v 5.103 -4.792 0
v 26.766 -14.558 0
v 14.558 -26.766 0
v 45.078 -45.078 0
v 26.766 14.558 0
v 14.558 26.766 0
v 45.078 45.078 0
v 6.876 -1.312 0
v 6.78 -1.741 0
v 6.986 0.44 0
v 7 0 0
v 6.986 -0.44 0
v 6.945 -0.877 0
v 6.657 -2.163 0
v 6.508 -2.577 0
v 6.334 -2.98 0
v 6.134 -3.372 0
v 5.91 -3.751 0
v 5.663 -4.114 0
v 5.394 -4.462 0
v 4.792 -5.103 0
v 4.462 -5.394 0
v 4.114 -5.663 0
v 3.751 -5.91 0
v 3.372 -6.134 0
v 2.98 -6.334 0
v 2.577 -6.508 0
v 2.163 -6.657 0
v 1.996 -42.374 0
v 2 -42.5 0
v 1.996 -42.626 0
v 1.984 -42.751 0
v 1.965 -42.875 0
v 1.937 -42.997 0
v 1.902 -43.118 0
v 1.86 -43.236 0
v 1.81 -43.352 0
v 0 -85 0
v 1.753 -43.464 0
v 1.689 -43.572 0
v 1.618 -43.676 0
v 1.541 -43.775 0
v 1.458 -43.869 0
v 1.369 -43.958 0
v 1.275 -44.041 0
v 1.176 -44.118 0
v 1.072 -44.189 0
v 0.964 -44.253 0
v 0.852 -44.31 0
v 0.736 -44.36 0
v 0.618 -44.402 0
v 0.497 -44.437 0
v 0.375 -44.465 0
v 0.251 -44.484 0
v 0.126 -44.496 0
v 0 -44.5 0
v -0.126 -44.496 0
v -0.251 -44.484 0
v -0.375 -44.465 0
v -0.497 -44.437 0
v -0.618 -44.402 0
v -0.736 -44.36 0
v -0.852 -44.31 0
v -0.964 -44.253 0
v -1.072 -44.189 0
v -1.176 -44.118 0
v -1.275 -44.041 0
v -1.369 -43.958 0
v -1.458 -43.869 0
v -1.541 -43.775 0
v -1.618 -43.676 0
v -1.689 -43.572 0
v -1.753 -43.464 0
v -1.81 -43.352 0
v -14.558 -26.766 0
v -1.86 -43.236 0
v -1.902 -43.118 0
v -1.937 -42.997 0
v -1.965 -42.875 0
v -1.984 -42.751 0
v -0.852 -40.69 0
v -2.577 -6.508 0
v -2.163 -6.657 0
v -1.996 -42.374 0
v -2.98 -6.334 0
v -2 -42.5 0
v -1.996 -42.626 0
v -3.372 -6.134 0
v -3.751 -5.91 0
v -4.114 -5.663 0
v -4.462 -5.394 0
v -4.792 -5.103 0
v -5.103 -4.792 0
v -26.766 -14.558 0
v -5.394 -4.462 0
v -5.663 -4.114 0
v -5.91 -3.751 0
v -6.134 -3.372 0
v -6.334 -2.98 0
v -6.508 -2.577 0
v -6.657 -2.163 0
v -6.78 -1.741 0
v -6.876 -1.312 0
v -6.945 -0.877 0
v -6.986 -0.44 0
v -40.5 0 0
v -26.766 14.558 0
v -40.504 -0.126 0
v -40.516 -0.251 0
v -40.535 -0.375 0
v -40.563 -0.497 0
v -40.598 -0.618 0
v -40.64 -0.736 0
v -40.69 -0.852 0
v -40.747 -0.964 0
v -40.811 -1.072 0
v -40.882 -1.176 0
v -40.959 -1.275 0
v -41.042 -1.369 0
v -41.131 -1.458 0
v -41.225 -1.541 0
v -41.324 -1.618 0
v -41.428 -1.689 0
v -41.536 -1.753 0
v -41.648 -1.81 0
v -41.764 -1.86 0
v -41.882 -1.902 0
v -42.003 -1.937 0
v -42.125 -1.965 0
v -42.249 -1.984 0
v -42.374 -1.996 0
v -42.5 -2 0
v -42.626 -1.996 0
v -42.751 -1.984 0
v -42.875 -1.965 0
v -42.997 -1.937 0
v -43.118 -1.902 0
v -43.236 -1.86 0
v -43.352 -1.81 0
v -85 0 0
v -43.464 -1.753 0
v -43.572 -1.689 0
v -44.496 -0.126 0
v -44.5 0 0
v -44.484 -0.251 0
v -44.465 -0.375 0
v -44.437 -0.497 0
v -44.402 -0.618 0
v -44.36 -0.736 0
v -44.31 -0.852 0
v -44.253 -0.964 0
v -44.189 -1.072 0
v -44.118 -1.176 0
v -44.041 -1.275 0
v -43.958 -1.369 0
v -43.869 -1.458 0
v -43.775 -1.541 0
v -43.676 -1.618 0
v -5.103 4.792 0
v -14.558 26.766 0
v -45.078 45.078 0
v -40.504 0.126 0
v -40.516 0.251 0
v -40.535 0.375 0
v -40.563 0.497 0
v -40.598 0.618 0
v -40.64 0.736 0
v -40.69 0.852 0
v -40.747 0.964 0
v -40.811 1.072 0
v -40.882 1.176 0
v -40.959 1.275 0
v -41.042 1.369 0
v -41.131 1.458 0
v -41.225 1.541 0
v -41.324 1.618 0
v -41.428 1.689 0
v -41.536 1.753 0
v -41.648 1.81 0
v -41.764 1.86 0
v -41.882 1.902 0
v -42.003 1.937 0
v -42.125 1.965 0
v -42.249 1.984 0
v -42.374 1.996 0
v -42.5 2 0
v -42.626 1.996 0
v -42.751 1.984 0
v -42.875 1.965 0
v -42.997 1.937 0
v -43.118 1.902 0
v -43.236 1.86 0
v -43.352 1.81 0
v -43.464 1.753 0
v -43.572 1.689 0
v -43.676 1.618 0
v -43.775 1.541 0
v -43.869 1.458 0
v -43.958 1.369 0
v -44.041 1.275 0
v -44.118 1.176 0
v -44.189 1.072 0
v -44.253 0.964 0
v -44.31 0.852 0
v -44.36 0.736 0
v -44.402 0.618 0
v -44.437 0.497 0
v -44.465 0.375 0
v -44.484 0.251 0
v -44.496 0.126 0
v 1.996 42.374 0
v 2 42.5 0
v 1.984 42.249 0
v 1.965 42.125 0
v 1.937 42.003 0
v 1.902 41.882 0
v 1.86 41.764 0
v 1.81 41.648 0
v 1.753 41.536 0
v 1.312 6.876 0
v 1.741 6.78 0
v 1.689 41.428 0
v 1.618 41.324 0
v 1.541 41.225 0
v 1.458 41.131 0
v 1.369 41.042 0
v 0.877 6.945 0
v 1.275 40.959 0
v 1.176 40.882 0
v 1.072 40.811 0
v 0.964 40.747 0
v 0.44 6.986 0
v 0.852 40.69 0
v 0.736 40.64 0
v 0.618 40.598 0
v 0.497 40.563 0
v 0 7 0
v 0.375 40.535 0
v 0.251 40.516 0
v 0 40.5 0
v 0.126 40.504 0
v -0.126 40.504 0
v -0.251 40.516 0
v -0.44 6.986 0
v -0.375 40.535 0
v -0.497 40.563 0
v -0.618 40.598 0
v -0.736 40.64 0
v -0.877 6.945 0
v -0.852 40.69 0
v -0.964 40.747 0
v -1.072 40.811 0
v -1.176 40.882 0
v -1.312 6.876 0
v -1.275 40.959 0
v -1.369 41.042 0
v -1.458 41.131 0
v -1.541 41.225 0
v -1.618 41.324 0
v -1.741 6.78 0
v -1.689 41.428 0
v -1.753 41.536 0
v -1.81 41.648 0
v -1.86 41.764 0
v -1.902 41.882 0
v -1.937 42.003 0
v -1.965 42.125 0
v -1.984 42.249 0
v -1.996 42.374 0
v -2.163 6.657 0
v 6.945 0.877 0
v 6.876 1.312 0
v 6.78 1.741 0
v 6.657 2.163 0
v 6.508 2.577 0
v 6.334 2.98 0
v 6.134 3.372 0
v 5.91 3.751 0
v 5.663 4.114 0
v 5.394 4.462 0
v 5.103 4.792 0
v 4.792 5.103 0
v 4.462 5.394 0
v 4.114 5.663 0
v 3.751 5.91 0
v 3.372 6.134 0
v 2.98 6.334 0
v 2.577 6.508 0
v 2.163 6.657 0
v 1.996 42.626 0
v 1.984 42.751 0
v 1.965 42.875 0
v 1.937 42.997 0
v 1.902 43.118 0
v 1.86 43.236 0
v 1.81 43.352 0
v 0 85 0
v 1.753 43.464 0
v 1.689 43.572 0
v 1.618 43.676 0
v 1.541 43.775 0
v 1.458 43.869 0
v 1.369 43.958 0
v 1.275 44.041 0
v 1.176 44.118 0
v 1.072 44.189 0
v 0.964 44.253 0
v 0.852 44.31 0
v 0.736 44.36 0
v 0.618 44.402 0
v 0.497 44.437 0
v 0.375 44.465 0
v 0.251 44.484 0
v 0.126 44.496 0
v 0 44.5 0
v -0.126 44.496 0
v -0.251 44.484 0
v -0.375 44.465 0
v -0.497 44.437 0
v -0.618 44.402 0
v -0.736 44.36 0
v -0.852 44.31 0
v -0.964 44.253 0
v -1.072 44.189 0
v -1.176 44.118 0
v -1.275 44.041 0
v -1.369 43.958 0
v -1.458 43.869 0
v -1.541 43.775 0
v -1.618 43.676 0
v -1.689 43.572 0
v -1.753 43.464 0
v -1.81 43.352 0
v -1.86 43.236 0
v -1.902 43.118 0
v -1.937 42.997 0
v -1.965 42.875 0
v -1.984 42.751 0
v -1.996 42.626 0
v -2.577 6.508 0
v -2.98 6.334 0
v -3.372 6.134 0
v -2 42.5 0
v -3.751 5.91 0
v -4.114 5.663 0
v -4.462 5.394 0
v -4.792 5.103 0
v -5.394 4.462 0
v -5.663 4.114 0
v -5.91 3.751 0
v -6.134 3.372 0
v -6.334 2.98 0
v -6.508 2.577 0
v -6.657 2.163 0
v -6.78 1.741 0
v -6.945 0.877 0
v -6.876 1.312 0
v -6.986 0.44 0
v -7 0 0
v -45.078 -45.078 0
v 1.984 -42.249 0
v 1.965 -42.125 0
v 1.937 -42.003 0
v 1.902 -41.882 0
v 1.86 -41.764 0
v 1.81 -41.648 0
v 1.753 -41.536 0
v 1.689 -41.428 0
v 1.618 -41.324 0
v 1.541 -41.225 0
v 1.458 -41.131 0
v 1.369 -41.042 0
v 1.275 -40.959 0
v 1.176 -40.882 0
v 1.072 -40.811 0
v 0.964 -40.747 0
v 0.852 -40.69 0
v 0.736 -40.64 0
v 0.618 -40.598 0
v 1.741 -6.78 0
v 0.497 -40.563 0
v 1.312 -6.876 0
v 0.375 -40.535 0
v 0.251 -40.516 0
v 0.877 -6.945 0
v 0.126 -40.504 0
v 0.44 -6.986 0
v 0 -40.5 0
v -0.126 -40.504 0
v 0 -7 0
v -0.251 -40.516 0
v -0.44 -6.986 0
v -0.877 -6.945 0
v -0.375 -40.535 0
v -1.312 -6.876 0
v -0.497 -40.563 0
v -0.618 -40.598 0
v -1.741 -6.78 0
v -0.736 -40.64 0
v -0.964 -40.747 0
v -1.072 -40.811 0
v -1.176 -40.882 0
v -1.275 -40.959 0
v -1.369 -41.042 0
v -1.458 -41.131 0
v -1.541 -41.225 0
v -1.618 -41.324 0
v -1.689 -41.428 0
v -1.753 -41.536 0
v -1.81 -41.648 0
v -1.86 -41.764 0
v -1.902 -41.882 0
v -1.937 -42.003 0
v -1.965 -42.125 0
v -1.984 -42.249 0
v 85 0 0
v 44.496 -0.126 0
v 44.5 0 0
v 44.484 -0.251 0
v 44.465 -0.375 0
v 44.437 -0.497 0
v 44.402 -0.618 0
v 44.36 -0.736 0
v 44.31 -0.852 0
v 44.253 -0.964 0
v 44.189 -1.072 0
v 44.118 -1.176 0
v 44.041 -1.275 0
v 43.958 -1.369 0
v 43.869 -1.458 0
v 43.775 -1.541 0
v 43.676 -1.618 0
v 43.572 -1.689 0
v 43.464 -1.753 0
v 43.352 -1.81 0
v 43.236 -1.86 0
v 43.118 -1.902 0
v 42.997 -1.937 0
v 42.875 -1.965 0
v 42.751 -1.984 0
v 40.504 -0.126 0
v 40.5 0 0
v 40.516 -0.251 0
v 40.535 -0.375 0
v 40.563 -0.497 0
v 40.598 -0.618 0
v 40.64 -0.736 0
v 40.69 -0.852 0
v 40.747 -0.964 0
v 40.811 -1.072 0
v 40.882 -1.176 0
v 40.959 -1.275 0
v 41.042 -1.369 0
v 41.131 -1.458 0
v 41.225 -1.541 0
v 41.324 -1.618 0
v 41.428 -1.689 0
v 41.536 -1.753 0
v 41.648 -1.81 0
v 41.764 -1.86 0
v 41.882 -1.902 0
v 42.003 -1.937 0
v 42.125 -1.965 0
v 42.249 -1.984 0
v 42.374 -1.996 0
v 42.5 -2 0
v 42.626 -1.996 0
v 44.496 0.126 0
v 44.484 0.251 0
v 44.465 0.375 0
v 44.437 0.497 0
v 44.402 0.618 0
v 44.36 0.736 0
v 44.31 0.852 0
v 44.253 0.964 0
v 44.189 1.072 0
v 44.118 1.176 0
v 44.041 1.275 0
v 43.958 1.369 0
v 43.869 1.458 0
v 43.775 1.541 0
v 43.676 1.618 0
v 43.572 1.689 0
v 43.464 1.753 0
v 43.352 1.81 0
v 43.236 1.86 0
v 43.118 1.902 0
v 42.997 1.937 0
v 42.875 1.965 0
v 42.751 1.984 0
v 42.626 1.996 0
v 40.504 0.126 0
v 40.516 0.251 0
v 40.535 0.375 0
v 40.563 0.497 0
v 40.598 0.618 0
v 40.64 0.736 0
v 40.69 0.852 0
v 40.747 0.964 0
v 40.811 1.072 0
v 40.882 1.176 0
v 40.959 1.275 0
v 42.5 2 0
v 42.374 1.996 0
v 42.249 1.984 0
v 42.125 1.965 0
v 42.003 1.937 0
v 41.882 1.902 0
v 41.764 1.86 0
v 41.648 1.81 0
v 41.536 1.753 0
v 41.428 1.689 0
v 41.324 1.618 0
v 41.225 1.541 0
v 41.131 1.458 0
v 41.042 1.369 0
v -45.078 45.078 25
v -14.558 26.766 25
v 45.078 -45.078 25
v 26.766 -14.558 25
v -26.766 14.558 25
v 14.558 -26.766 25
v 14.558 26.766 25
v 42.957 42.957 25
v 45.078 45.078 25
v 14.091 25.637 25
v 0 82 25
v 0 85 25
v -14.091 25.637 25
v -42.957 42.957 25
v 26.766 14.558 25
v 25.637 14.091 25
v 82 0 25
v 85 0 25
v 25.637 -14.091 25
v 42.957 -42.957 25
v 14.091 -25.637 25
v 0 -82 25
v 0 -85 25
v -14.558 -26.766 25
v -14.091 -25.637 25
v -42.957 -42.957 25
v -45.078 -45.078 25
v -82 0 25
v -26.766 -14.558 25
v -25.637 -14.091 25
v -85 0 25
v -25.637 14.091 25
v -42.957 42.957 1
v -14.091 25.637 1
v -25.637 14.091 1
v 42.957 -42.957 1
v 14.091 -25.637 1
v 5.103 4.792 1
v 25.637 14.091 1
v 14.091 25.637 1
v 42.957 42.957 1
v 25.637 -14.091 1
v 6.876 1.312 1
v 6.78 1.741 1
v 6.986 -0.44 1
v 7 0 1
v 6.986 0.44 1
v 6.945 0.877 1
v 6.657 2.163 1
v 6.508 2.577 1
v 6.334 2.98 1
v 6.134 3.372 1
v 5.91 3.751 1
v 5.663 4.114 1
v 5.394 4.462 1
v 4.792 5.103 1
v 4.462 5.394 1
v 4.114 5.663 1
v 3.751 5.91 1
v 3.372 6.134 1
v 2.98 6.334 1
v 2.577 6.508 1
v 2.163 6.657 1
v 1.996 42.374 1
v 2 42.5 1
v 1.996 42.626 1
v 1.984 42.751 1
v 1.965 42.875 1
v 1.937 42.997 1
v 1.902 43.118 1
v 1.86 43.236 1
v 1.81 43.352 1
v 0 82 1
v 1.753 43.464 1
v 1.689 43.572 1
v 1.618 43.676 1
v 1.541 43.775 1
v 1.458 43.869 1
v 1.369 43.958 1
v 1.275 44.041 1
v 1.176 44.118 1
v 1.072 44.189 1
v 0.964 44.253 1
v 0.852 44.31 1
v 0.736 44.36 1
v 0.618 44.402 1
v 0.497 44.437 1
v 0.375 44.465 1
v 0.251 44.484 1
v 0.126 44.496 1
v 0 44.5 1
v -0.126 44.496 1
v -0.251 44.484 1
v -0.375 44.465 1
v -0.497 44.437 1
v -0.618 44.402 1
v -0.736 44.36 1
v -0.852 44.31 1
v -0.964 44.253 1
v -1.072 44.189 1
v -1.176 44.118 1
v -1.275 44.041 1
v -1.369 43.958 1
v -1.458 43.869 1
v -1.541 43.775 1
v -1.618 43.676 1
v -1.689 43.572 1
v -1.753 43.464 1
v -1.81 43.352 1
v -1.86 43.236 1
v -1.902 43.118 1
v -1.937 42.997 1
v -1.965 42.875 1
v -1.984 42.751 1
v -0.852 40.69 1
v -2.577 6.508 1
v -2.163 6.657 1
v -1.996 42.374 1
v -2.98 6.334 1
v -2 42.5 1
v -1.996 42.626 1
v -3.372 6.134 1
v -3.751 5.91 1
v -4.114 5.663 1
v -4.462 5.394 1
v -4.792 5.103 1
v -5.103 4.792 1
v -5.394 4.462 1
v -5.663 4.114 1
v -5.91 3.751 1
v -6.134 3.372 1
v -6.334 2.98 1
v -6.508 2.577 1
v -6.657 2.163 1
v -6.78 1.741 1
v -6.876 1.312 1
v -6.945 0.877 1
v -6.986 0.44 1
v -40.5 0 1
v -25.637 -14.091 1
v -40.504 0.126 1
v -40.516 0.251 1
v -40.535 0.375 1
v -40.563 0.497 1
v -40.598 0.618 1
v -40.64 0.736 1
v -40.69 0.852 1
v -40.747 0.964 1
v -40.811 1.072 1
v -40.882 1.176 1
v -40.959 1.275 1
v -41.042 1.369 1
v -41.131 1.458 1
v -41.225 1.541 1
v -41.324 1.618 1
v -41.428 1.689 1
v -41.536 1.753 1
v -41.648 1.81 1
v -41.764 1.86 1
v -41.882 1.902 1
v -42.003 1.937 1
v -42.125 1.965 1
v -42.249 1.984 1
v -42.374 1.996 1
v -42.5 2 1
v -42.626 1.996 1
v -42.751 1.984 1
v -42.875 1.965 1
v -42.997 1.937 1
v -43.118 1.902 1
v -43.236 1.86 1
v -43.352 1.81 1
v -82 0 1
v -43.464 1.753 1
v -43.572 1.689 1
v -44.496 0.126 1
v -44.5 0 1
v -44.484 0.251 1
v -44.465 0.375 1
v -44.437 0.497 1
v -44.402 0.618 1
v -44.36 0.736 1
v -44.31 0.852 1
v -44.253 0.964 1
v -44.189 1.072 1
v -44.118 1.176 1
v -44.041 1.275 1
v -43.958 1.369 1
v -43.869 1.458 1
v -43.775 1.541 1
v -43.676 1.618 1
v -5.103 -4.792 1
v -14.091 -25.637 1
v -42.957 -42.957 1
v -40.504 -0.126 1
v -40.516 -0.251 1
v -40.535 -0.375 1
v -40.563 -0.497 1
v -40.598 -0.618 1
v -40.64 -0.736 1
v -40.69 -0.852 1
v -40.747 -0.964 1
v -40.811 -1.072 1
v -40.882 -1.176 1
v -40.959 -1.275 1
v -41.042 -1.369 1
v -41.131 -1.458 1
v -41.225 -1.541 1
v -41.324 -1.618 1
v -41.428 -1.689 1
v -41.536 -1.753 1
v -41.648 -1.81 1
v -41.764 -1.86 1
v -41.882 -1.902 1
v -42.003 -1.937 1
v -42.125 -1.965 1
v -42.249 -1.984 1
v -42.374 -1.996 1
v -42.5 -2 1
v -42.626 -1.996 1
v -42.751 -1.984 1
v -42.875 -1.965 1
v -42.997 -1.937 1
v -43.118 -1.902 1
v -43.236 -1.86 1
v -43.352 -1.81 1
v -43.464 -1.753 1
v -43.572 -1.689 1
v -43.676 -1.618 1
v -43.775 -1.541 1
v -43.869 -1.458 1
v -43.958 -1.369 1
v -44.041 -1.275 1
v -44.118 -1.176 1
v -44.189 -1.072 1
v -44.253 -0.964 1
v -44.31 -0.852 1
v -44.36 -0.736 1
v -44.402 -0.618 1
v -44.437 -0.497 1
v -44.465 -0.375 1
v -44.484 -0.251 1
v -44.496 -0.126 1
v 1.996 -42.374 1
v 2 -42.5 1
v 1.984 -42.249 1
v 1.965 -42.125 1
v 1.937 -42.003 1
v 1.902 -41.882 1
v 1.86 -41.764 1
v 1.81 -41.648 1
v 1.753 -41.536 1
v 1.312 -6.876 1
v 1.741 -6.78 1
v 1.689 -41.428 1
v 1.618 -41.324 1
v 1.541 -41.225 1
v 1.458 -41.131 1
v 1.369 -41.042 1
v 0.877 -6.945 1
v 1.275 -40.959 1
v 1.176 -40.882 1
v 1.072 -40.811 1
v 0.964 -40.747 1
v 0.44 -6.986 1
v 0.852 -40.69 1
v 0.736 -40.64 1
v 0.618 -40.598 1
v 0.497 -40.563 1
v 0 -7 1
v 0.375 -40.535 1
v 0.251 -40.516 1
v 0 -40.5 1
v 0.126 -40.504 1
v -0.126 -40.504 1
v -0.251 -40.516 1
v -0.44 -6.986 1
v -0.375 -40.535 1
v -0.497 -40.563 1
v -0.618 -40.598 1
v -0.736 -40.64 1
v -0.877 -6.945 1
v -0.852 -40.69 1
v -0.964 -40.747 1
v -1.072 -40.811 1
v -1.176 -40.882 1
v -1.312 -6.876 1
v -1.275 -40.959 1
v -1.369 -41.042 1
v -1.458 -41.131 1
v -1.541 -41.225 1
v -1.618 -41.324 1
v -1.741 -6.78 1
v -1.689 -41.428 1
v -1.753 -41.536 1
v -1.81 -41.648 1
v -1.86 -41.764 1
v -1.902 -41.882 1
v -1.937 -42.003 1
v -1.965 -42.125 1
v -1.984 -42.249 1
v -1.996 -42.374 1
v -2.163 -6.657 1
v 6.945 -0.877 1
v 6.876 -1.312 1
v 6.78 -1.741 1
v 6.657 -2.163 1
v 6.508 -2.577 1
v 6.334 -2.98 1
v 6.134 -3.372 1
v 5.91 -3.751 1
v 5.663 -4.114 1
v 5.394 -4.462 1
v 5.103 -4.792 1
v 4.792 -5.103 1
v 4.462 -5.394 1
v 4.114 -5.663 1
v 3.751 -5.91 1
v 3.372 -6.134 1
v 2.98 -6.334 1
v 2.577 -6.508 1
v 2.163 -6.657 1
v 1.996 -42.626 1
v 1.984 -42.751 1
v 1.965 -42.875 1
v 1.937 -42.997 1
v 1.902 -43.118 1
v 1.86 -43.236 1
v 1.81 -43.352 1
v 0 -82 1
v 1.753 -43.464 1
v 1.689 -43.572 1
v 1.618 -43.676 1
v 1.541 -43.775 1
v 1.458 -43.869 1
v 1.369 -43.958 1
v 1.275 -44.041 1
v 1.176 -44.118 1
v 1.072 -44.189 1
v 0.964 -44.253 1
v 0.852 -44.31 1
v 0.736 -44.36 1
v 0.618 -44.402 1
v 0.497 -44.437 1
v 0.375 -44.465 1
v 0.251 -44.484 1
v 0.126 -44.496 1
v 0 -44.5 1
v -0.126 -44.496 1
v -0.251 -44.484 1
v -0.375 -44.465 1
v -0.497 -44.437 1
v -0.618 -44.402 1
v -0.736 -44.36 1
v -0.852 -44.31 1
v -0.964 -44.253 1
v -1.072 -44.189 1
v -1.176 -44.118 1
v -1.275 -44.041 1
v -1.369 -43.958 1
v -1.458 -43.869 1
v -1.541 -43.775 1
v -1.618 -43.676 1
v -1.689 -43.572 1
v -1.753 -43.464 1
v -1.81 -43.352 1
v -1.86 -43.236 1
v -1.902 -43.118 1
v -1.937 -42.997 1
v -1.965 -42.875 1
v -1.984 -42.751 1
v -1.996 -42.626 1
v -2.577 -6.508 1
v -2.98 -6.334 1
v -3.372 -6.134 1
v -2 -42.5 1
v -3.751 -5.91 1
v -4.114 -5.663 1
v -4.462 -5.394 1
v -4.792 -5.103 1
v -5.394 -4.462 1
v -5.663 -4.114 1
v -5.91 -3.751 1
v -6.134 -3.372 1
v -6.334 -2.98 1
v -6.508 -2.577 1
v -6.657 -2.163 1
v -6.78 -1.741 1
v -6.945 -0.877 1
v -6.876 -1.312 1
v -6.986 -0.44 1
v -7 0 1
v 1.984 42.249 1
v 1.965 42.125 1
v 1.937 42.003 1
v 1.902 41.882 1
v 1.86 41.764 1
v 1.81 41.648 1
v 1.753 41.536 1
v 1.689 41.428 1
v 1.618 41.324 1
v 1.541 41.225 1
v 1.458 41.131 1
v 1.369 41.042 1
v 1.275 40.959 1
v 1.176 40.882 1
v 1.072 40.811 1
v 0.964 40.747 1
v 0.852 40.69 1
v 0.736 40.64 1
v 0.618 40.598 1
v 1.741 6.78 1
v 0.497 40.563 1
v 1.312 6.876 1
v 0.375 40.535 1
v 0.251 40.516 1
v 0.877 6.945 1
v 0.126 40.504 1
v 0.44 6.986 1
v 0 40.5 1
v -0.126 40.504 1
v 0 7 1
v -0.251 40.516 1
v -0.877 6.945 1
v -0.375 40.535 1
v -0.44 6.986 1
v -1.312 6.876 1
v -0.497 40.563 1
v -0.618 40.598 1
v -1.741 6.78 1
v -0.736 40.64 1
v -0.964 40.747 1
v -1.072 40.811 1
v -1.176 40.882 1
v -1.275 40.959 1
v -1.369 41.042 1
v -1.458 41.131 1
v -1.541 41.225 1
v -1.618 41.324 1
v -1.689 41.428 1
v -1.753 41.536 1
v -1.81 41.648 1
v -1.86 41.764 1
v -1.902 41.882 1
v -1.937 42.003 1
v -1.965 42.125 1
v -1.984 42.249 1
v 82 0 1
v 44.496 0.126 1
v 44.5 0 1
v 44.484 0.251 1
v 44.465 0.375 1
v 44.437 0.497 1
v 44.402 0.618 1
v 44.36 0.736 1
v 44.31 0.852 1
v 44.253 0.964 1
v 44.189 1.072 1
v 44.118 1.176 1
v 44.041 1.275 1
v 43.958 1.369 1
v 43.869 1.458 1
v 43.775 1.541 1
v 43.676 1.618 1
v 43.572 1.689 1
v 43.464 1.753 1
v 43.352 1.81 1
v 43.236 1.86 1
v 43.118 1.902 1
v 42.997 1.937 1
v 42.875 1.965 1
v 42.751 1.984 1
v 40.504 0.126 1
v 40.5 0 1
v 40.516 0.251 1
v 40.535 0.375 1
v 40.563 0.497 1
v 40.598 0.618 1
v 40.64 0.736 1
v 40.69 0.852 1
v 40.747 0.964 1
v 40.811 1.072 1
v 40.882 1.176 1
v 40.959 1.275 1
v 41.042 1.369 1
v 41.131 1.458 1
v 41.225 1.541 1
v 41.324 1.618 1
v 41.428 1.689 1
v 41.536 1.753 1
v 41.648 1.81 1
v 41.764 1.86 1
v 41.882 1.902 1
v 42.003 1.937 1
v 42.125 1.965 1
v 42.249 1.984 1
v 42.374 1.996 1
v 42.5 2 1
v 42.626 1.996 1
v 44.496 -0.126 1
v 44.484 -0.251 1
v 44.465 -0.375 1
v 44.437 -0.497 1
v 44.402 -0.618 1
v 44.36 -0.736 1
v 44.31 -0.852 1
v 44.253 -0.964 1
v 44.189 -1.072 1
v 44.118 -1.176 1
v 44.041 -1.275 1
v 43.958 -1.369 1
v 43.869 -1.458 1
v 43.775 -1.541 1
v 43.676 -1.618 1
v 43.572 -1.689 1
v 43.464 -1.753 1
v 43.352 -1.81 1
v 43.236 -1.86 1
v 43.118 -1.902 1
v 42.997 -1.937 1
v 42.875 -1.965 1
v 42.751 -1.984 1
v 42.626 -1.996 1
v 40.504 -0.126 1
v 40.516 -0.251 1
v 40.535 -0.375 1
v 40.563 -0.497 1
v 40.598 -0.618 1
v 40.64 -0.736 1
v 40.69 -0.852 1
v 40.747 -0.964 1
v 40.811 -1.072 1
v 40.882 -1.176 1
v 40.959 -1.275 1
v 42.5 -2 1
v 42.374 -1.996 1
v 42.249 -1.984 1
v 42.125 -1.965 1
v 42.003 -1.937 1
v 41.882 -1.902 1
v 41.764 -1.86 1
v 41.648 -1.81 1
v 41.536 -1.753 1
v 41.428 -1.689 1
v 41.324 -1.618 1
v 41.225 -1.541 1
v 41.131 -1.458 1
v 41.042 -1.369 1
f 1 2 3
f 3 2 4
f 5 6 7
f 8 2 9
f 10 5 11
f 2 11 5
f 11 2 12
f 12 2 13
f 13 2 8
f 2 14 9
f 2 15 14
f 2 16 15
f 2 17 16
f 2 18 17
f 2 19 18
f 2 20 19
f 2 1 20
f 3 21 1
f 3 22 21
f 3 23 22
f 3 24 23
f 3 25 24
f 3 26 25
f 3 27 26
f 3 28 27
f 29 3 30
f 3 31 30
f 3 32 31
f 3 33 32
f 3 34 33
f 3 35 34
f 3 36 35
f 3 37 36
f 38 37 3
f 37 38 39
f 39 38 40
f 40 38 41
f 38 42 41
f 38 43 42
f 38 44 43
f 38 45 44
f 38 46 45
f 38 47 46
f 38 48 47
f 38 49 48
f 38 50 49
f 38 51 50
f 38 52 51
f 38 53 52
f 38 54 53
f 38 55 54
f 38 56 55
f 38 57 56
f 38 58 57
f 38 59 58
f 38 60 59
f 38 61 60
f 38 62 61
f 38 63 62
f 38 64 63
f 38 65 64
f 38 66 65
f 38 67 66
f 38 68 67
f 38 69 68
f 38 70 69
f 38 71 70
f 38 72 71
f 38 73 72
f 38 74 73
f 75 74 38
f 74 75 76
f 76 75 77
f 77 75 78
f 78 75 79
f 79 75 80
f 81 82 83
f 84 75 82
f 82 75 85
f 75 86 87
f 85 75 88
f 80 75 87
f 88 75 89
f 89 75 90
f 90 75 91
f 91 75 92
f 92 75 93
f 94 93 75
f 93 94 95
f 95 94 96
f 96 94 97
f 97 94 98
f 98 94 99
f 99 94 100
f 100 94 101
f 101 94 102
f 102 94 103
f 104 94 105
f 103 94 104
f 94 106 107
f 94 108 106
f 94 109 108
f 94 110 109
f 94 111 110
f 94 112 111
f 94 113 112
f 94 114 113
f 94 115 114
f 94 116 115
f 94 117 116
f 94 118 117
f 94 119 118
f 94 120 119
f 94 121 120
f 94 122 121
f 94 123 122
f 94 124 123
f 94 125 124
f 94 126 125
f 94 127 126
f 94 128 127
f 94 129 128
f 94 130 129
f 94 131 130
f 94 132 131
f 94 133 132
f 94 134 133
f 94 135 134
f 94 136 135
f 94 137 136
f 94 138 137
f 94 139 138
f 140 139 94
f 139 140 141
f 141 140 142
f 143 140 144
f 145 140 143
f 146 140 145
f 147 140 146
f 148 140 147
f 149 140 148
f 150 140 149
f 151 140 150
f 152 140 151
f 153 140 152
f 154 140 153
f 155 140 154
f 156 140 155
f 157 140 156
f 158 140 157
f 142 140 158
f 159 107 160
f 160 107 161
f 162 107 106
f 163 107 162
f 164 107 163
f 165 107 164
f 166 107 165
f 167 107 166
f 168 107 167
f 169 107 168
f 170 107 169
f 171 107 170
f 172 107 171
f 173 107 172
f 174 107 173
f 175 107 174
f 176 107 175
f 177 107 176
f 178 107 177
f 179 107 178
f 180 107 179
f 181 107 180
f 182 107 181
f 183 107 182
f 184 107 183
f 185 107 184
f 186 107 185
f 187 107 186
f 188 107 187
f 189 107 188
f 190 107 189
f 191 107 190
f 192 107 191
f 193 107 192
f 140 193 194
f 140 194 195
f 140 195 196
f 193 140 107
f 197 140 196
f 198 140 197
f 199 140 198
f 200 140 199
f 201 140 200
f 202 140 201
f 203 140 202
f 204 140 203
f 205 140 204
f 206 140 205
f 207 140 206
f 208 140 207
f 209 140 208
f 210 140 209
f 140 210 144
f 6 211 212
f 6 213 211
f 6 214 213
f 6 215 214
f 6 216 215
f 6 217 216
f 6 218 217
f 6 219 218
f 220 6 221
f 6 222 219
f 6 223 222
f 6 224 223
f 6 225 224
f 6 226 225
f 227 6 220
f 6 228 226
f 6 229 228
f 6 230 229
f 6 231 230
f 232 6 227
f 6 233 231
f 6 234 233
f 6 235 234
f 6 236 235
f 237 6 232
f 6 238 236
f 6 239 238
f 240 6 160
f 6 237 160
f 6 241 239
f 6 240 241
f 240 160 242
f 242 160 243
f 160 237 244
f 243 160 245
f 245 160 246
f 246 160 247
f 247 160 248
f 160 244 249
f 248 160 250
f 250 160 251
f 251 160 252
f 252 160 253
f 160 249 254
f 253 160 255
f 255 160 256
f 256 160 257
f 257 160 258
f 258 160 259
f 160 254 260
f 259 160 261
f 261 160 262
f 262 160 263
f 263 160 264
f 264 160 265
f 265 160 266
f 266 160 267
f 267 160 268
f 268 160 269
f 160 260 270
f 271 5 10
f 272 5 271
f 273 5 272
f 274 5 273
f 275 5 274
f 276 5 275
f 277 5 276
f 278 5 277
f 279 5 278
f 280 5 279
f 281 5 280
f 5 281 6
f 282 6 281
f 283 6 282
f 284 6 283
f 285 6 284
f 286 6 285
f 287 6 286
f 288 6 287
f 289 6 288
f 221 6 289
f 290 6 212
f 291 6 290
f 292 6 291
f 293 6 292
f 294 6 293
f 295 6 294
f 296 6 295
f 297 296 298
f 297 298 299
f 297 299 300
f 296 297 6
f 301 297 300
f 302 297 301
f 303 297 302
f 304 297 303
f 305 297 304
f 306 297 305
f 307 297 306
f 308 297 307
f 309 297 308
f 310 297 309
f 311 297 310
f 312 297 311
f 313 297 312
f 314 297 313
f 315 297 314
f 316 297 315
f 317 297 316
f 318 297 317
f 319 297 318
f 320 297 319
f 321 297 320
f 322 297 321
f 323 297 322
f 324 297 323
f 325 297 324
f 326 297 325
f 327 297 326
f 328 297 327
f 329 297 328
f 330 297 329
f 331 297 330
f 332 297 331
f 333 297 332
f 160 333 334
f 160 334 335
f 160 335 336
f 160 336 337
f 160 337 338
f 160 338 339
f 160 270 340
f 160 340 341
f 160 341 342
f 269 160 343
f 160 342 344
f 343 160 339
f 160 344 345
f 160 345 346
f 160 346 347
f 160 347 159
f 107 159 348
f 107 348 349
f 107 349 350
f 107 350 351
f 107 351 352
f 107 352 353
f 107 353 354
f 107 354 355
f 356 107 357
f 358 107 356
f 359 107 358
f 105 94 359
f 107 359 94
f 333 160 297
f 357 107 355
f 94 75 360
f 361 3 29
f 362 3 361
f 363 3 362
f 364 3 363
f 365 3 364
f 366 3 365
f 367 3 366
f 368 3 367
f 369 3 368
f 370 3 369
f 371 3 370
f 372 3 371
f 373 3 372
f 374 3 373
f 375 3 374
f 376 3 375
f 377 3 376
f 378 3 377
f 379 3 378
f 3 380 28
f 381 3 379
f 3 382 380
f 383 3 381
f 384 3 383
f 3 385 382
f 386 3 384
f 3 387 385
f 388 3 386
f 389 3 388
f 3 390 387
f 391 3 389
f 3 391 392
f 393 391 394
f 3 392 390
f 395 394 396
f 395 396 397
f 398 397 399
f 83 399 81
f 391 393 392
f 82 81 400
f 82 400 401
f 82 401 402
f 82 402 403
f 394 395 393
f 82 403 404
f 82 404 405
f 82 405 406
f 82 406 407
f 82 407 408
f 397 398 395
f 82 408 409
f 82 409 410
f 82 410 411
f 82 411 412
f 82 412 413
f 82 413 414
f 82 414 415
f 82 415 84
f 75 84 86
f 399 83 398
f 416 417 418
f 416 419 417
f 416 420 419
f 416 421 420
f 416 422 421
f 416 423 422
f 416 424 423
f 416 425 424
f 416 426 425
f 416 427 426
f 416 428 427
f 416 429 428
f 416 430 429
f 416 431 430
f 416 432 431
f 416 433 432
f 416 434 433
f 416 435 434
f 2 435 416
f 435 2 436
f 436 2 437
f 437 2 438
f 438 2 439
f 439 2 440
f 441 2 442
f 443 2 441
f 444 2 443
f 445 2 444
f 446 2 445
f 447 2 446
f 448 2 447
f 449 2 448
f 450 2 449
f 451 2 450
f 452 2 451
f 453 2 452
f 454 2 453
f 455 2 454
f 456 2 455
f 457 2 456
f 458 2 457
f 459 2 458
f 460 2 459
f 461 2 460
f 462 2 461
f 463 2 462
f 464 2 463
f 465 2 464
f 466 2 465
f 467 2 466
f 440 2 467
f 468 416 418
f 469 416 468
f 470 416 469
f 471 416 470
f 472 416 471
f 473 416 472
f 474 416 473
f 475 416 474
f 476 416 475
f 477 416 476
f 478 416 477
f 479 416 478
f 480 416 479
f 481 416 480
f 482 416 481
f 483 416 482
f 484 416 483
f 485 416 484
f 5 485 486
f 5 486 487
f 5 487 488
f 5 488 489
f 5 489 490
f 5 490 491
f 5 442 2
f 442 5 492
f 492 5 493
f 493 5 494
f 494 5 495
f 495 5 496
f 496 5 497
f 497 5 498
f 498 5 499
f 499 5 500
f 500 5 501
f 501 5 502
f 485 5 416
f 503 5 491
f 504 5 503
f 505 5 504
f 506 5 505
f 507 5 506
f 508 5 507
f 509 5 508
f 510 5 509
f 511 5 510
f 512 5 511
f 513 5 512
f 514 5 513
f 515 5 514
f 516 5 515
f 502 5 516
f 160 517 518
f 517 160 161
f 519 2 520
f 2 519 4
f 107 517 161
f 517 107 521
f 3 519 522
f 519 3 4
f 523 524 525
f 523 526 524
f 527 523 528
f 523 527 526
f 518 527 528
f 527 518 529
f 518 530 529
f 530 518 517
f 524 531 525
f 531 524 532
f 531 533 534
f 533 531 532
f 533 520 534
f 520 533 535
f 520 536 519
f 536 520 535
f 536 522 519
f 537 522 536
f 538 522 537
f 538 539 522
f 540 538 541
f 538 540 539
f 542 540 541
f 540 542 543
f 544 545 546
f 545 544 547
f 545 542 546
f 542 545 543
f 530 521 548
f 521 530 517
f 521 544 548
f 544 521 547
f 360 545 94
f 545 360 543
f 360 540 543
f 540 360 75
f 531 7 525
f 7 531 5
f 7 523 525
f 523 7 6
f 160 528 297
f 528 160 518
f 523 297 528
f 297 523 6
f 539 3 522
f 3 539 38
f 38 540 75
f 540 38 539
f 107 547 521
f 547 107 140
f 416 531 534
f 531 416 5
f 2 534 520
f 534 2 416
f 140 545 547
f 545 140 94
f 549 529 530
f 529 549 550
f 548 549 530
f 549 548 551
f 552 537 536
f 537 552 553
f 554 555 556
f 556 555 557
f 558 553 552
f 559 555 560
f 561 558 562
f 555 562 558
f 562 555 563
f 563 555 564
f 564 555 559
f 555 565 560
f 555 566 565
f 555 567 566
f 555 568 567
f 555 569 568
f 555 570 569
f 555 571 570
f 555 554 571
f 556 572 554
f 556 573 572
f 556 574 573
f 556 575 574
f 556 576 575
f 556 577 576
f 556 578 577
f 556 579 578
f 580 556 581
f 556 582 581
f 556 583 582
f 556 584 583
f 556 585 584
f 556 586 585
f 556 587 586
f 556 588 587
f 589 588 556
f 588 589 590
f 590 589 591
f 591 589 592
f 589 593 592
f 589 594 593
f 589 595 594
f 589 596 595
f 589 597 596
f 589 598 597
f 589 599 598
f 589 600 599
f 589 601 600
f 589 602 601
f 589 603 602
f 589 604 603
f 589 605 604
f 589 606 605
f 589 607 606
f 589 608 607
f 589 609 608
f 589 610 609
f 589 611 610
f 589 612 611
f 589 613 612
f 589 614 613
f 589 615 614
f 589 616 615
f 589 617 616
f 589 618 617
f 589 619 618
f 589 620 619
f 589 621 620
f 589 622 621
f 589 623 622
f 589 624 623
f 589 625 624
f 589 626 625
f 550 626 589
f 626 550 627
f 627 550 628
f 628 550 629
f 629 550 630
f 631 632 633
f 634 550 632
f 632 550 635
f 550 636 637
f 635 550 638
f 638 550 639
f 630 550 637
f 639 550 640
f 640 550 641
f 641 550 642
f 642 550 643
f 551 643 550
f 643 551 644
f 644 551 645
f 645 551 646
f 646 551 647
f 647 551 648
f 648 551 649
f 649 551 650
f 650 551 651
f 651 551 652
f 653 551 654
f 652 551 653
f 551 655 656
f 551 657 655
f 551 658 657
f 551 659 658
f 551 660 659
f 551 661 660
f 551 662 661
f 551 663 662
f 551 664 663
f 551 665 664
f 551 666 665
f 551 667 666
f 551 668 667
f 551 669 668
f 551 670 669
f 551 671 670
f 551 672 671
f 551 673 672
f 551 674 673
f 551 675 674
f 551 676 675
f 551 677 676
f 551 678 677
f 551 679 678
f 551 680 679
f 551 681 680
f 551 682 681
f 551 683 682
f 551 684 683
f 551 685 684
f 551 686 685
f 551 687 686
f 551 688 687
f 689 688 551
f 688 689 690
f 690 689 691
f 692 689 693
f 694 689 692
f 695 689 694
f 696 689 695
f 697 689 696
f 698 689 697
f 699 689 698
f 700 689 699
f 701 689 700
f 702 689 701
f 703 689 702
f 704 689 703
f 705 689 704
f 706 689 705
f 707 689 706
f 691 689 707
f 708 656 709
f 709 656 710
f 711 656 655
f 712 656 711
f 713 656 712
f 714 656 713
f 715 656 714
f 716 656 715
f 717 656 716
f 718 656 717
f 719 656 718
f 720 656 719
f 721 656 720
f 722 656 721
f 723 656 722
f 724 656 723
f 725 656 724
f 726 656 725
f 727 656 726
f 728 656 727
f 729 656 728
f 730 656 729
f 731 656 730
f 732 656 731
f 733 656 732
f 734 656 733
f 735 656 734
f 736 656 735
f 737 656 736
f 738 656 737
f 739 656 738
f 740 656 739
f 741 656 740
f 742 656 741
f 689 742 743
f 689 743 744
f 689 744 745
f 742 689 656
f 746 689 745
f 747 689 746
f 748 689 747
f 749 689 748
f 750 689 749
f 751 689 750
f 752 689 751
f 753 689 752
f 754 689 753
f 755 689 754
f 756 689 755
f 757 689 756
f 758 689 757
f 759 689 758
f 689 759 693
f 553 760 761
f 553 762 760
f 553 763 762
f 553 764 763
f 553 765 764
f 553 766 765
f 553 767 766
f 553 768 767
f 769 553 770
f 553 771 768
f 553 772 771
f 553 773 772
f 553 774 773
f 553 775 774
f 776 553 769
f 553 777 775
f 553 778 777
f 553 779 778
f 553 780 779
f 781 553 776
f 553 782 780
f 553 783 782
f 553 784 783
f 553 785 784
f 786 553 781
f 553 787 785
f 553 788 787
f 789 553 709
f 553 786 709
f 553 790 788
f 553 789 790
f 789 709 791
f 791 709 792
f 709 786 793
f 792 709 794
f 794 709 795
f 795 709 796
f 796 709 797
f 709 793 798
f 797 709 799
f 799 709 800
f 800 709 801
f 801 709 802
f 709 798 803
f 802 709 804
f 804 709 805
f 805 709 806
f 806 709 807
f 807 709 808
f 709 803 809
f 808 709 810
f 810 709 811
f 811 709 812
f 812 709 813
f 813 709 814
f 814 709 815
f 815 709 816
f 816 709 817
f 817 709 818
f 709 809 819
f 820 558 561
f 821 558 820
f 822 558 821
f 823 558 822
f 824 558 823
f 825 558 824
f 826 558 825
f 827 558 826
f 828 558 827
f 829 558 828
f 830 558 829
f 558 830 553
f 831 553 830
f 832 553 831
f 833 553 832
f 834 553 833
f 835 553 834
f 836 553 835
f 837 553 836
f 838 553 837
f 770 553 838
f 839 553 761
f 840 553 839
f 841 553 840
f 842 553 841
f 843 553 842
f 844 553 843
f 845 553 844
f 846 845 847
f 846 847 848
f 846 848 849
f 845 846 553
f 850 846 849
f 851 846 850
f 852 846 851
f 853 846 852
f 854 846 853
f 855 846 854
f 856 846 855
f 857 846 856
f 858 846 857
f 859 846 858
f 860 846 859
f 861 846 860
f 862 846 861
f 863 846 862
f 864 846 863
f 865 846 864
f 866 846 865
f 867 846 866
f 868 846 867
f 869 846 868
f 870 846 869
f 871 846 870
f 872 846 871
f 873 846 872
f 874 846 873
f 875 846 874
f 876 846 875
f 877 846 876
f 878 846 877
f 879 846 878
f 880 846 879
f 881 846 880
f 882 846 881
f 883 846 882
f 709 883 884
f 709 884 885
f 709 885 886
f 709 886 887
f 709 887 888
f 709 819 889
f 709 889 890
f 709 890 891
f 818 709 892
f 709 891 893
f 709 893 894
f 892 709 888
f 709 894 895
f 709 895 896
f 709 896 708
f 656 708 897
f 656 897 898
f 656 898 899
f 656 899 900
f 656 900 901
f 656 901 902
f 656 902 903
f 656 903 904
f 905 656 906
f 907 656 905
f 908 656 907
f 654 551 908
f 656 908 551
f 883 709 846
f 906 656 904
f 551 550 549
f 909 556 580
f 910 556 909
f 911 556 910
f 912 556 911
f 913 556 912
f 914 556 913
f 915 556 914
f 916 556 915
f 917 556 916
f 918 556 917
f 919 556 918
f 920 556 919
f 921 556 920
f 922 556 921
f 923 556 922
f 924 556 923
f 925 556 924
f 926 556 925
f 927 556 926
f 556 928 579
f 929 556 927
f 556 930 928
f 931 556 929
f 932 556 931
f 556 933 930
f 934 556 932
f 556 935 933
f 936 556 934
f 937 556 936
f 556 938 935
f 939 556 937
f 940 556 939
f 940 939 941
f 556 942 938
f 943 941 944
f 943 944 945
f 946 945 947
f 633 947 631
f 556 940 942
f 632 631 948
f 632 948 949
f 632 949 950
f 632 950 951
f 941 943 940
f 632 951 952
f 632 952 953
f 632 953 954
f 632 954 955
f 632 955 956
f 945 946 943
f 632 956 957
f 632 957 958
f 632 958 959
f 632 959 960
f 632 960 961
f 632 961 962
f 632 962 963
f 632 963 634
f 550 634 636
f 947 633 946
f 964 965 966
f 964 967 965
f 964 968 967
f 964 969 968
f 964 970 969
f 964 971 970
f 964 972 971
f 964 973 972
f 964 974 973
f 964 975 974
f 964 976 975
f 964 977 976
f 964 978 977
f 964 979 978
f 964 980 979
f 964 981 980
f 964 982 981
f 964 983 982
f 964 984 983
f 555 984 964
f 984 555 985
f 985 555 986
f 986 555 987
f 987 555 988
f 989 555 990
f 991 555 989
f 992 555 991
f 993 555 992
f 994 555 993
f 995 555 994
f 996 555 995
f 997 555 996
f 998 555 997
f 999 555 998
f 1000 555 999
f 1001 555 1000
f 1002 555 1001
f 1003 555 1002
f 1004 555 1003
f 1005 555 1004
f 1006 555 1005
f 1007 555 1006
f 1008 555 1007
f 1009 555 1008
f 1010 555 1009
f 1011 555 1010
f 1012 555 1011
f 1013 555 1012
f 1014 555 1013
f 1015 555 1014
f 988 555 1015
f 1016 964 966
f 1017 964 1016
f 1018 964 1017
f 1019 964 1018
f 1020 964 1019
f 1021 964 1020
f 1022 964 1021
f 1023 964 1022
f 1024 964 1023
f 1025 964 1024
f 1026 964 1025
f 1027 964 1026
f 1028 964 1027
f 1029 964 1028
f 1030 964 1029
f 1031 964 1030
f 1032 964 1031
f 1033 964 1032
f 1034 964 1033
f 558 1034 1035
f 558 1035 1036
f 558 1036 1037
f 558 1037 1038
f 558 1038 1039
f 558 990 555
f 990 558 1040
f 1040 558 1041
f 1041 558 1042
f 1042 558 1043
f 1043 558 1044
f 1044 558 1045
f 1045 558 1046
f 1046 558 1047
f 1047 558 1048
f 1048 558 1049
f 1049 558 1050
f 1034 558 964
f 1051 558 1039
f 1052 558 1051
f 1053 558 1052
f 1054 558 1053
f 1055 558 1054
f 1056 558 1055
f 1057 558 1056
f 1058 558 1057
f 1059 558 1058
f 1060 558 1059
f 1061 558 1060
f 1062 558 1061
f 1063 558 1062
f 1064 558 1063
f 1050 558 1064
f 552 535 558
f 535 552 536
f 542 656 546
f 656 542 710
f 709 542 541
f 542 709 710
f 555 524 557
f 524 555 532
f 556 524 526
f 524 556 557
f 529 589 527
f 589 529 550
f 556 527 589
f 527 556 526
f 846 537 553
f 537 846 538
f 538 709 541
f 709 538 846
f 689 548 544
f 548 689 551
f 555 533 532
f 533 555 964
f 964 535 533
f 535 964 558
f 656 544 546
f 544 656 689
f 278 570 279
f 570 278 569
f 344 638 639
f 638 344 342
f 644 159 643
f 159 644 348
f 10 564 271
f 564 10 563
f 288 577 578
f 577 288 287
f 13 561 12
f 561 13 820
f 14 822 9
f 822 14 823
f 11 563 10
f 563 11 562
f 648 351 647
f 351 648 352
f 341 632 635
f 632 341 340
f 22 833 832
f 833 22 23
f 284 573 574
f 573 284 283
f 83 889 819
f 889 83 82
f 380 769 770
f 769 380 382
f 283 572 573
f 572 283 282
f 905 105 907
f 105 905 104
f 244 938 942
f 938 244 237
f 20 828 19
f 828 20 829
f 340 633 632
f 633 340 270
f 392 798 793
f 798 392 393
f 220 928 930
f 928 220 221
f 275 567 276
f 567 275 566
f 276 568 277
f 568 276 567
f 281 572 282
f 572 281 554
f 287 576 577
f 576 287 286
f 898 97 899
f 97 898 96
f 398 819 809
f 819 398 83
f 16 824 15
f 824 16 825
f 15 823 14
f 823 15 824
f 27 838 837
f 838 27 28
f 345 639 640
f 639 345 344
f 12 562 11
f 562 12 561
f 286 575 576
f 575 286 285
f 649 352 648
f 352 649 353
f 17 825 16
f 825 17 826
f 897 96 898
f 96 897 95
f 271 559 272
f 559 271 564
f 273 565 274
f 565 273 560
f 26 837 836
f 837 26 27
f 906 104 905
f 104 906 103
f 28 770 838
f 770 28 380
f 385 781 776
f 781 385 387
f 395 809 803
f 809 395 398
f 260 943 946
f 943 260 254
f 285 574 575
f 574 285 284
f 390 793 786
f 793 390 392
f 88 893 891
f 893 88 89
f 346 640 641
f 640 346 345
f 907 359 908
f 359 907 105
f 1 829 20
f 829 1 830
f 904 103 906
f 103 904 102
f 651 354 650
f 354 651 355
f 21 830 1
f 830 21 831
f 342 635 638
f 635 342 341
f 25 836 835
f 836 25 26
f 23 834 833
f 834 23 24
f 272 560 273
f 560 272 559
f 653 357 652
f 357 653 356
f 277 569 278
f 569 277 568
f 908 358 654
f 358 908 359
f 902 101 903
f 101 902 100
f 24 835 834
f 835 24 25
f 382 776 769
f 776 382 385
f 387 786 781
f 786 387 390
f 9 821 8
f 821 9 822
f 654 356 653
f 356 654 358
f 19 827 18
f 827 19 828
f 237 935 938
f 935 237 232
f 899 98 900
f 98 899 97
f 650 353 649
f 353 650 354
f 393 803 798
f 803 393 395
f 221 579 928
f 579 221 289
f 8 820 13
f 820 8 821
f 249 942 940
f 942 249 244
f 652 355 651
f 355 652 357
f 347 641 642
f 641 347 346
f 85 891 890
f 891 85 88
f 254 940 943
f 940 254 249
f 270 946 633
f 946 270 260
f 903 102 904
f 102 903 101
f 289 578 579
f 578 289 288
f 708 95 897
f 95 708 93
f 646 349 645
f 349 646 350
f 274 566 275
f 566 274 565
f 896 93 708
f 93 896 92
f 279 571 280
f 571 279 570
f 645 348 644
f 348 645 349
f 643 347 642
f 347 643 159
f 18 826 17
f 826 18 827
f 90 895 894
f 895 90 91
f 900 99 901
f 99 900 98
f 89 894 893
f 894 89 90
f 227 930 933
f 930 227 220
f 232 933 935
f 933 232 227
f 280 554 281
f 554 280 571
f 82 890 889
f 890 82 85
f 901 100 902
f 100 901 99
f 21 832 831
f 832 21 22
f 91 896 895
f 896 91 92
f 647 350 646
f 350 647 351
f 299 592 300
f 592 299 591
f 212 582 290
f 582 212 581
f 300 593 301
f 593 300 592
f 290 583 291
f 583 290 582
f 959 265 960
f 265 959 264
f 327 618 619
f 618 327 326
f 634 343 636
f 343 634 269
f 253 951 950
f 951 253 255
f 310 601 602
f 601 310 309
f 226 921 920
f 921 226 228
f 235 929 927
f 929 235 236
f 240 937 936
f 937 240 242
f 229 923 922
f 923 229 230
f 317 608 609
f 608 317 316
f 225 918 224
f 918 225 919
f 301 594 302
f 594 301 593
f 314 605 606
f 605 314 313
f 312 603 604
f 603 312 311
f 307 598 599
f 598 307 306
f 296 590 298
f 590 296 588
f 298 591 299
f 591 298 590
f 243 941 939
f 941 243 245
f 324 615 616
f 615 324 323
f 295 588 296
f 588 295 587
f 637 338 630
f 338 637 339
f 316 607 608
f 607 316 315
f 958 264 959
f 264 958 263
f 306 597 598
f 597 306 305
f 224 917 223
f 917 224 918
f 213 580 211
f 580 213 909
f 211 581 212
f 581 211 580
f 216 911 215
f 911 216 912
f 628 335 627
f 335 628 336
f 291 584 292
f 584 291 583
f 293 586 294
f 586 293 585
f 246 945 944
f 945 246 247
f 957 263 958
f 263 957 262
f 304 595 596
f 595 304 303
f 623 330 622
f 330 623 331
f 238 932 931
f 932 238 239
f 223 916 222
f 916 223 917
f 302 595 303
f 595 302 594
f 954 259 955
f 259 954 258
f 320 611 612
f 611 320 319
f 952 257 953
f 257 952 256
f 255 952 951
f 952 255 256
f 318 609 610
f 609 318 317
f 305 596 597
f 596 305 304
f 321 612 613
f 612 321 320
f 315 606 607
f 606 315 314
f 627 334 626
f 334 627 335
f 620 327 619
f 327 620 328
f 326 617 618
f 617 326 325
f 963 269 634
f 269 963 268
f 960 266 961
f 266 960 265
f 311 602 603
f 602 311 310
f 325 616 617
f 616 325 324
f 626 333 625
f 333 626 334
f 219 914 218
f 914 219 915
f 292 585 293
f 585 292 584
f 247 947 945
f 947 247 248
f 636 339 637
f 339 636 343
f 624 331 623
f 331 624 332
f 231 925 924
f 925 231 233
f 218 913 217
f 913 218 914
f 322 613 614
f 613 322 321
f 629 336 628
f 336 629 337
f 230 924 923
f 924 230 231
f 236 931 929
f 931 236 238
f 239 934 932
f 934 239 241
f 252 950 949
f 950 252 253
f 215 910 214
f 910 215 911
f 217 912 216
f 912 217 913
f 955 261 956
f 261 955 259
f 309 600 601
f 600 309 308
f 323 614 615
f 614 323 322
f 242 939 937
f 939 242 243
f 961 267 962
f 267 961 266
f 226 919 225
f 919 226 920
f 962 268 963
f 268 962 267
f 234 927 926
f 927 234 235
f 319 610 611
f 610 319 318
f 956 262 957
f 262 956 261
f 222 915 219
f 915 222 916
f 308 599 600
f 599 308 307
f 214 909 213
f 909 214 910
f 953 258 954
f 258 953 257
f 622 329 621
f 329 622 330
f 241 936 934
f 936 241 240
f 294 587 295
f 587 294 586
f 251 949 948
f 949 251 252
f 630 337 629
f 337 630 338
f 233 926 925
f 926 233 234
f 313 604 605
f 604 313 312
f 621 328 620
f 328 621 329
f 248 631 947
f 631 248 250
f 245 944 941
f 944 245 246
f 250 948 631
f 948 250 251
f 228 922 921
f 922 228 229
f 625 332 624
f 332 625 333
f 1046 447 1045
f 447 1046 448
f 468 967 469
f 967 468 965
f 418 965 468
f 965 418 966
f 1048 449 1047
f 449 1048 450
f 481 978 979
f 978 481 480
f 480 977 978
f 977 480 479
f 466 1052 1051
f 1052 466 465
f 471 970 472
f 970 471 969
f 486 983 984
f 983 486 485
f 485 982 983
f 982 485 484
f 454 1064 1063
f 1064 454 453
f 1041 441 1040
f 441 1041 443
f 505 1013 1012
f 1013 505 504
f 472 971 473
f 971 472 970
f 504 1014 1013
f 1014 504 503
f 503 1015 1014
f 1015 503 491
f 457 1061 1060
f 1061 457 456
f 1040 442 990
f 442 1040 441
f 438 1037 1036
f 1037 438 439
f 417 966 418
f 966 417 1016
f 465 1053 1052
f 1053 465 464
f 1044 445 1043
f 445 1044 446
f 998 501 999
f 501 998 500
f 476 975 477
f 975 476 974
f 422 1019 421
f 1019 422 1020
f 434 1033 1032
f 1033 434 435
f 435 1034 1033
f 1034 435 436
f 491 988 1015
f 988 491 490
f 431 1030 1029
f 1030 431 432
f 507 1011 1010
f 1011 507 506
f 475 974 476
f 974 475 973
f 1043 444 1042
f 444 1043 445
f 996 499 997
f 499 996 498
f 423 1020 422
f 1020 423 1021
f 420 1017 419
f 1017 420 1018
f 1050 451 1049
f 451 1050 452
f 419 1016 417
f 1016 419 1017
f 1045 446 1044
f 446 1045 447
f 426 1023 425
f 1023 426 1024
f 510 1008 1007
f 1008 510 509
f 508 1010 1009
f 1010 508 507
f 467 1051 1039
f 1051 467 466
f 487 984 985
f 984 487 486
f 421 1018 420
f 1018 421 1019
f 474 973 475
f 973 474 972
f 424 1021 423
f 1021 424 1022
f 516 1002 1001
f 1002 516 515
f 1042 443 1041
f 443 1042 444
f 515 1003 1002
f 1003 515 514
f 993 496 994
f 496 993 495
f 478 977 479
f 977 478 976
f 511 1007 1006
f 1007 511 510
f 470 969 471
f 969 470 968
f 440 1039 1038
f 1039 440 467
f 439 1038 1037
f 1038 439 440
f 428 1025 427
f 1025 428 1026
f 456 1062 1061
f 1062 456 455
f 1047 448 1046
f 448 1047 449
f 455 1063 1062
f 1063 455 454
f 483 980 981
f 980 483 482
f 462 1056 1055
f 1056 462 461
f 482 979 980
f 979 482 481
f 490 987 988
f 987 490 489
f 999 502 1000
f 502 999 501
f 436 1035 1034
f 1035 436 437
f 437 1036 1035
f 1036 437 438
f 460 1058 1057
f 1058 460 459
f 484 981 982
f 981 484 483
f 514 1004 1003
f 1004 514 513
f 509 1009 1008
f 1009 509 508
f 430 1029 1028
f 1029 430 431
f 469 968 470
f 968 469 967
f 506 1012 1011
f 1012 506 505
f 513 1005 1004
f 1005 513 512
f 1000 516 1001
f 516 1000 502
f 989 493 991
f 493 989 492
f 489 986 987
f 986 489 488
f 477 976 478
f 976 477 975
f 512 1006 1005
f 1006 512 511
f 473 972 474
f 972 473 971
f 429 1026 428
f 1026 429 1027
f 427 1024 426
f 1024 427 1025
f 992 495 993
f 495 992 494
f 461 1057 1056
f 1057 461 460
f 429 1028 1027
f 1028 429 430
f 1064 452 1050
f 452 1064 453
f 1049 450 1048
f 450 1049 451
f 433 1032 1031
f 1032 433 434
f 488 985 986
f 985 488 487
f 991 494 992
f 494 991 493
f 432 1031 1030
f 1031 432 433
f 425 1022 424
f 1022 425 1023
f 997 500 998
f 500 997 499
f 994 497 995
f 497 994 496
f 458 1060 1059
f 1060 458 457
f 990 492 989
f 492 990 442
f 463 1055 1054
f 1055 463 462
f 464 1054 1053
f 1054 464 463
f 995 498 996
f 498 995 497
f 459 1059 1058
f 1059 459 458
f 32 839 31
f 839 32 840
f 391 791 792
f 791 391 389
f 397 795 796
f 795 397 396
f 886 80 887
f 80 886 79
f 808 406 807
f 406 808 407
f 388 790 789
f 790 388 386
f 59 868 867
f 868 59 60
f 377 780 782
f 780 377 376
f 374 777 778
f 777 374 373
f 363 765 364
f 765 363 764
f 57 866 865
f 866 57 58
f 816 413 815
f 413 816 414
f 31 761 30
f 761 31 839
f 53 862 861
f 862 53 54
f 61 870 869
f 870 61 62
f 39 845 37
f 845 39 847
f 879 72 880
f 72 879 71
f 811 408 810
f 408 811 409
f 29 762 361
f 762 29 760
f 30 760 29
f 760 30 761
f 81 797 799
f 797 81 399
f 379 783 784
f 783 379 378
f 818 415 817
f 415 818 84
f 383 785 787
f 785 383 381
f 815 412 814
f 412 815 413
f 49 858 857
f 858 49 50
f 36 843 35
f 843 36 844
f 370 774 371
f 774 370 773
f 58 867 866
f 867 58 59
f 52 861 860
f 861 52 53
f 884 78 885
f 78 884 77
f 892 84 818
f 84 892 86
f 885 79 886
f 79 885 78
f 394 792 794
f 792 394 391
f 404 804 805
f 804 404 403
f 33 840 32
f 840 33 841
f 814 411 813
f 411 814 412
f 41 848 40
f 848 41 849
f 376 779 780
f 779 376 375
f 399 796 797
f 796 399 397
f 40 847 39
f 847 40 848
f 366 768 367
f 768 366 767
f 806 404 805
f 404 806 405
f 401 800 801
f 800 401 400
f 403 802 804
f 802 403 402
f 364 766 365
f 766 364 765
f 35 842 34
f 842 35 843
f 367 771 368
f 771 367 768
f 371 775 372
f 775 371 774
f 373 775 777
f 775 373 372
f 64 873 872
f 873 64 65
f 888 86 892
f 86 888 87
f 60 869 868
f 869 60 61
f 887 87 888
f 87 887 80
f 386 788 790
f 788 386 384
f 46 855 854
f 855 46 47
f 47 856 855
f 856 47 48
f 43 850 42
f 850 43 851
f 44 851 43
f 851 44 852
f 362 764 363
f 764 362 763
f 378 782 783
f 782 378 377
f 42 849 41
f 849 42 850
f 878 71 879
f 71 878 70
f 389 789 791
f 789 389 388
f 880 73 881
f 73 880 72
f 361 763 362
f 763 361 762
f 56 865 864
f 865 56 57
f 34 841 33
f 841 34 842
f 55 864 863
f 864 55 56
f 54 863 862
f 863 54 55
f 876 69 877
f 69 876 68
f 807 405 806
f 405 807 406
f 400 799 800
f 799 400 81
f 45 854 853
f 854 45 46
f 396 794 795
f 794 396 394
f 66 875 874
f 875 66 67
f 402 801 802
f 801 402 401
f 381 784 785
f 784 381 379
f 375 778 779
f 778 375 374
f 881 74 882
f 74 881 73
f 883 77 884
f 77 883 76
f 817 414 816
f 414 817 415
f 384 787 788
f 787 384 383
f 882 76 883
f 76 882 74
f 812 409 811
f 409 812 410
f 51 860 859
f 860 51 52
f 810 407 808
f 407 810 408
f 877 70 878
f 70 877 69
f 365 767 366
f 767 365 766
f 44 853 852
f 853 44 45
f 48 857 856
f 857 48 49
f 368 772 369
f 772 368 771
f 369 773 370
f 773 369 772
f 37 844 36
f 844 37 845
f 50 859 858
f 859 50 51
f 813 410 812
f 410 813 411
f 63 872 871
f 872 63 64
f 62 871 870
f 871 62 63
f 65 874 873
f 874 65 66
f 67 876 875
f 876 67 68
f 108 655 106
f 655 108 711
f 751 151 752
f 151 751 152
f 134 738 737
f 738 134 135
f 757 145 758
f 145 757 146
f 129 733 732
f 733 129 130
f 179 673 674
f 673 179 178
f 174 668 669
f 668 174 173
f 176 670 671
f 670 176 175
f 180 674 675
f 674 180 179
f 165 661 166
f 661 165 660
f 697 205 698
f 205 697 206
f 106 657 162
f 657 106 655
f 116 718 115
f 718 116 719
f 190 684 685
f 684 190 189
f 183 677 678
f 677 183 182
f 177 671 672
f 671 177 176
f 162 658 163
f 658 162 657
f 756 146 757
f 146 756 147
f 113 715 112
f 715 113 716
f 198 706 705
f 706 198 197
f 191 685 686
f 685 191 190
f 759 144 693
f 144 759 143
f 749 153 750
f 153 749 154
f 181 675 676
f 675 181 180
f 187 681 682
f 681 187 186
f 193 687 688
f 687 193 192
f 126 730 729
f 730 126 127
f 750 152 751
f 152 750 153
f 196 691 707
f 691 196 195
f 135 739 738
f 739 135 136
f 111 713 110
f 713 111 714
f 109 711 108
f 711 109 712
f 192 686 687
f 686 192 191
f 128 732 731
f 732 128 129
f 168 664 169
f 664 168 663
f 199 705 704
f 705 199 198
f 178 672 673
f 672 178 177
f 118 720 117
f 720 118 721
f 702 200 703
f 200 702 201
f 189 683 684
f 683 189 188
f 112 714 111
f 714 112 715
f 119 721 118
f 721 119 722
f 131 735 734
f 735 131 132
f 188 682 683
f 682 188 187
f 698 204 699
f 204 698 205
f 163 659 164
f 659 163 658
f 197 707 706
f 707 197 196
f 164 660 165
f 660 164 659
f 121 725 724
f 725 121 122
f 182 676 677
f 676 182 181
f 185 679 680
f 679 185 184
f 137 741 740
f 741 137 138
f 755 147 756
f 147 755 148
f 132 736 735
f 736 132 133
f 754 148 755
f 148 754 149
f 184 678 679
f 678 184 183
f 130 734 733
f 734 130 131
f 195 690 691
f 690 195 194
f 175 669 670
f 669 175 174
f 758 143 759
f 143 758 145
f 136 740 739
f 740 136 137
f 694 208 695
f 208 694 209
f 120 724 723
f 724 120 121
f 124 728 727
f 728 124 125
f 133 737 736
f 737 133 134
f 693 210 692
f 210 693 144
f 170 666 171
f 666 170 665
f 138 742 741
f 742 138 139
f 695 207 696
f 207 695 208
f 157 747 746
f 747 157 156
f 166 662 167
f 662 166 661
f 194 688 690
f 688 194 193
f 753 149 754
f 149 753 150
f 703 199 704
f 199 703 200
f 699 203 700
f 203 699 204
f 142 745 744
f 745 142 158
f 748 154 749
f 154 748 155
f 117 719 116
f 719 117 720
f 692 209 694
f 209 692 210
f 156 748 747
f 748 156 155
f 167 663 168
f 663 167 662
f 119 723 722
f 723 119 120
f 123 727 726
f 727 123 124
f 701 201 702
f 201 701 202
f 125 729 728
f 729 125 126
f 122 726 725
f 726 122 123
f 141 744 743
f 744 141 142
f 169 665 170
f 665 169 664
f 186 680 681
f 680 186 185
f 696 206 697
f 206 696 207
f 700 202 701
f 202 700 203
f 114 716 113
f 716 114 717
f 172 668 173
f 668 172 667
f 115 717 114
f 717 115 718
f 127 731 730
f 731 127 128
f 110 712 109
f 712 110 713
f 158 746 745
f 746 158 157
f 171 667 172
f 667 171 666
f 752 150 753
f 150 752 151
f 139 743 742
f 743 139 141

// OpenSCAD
/*
 * vim:ts=4:sw=4:sts=4:et:ai:si:fdm=marker:tw=100
 *
 * bigclivedotcom
 *
 * Since many of you thought my last star generating OpenSCAD script was from the Famous "Welcome to fabulous Las Vegas" sign, here's a version that makes that star.
 * I've included "customizer" options in the script to allow you to adjust it to your preference.
 */


//Vegas star script by bigclivedotcom
//Size of star (mm)
size=170;

//Star plumpness 0.1-0.5 
plump=0.25;

//Depth of star (mm)
depth=25;

//Back wall thickness (mm)
thick=1;

//Side wall thickness (adjust to suit)
side=3;

//Lamp hole diameter (mm)
lamp=14;

//Screw hole diameter (mm)
screw=4;
wall=2*side;
fixing=size/4;

difference() {
    union() {
        //Star body
        rotate([0,0,45])
            scale([plump,1,1])
                cylinder(depth,d=size*.75);
        rotate([0,0,135])
            scale([plump,1,1])
                cylinder(depth,d=size*.75);
        scale([plump,1,1])
            cylinder(depth,d=size);
        scale([1,plump,1])
            cylinder(depth,d=size);
    }

    //Star interior
    rotate([0,0,45])
        scale([plump,1,1])
            translate([0,0,thick])
                cylinder(depth,d=(size*.75)-wall);
    rotate([0,0,135])
        scale([plump,1,1])
            translate([0,0,thick])
                cylinder(depth,d=(size*.75)-wall);
    scale([plump,1,1])
        translate([0,0,thick])
            cylinder(depth,d=size-wall);
    scale([1,plump,1])
        translate([0,0,thick])
            cylinder(depth,d=size-wall);

    //Lamp socket hole
    translate([0,0,-1])
        cylinder(thick+2,d=lamp,$fn=100);

    //Screw holes
    translate([0,fixing,-1])
        cylinder(thick+2,d=screw,$fn=100);
    translate([fixing,0,-1])
        cylinder(thick+2,d=screw,$fn=100);
    translate([0,-fixing,-1])
        cylinder(thick+2,d=screw,$fn=100);
    translate([-fixing,0,-1])
        cylinder(thick+2,d=screw,$fn=100);
}
$fn=4; 
